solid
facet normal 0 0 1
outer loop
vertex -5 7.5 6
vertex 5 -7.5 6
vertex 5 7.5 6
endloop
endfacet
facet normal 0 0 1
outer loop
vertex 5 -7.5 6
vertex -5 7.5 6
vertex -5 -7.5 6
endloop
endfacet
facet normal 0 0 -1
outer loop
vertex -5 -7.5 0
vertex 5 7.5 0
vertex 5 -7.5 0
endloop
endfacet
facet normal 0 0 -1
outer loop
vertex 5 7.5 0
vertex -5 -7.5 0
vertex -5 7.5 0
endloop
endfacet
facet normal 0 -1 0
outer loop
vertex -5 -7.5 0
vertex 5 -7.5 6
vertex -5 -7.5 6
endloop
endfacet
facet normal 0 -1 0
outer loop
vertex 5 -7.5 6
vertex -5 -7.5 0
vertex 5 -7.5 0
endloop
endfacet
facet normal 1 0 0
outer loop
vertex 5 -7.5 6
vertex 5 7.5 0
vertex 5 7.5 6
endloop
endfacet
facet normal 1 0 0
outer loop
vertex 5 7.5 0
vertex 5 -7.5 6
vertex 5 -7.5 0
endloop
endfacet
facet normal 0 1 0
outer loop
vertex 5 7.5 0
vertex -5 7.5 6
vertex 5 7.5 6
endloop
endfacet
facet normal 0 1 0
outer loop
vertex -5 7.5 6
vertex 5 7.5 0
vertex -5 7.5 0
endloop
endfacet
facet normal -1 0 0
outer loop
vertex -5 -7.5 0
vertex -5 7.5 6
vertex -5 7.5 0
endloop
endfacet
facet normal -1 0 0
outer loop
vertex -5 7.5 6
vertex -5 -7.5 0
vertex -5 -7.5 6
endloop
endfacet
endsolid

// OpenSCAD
// brick 2x3

// external vars #########################

ext_scale = 1.0;
ext_fn = 12;

// part ##################################

module brick_2x3(m_scale=ext_scale,m_fn=ext_fn) {
    scale([m_scale,m_scale,m_scale])
    translate([-5,-7.5,0])
    cube([10,15,6]);
}

brick_2x3();
